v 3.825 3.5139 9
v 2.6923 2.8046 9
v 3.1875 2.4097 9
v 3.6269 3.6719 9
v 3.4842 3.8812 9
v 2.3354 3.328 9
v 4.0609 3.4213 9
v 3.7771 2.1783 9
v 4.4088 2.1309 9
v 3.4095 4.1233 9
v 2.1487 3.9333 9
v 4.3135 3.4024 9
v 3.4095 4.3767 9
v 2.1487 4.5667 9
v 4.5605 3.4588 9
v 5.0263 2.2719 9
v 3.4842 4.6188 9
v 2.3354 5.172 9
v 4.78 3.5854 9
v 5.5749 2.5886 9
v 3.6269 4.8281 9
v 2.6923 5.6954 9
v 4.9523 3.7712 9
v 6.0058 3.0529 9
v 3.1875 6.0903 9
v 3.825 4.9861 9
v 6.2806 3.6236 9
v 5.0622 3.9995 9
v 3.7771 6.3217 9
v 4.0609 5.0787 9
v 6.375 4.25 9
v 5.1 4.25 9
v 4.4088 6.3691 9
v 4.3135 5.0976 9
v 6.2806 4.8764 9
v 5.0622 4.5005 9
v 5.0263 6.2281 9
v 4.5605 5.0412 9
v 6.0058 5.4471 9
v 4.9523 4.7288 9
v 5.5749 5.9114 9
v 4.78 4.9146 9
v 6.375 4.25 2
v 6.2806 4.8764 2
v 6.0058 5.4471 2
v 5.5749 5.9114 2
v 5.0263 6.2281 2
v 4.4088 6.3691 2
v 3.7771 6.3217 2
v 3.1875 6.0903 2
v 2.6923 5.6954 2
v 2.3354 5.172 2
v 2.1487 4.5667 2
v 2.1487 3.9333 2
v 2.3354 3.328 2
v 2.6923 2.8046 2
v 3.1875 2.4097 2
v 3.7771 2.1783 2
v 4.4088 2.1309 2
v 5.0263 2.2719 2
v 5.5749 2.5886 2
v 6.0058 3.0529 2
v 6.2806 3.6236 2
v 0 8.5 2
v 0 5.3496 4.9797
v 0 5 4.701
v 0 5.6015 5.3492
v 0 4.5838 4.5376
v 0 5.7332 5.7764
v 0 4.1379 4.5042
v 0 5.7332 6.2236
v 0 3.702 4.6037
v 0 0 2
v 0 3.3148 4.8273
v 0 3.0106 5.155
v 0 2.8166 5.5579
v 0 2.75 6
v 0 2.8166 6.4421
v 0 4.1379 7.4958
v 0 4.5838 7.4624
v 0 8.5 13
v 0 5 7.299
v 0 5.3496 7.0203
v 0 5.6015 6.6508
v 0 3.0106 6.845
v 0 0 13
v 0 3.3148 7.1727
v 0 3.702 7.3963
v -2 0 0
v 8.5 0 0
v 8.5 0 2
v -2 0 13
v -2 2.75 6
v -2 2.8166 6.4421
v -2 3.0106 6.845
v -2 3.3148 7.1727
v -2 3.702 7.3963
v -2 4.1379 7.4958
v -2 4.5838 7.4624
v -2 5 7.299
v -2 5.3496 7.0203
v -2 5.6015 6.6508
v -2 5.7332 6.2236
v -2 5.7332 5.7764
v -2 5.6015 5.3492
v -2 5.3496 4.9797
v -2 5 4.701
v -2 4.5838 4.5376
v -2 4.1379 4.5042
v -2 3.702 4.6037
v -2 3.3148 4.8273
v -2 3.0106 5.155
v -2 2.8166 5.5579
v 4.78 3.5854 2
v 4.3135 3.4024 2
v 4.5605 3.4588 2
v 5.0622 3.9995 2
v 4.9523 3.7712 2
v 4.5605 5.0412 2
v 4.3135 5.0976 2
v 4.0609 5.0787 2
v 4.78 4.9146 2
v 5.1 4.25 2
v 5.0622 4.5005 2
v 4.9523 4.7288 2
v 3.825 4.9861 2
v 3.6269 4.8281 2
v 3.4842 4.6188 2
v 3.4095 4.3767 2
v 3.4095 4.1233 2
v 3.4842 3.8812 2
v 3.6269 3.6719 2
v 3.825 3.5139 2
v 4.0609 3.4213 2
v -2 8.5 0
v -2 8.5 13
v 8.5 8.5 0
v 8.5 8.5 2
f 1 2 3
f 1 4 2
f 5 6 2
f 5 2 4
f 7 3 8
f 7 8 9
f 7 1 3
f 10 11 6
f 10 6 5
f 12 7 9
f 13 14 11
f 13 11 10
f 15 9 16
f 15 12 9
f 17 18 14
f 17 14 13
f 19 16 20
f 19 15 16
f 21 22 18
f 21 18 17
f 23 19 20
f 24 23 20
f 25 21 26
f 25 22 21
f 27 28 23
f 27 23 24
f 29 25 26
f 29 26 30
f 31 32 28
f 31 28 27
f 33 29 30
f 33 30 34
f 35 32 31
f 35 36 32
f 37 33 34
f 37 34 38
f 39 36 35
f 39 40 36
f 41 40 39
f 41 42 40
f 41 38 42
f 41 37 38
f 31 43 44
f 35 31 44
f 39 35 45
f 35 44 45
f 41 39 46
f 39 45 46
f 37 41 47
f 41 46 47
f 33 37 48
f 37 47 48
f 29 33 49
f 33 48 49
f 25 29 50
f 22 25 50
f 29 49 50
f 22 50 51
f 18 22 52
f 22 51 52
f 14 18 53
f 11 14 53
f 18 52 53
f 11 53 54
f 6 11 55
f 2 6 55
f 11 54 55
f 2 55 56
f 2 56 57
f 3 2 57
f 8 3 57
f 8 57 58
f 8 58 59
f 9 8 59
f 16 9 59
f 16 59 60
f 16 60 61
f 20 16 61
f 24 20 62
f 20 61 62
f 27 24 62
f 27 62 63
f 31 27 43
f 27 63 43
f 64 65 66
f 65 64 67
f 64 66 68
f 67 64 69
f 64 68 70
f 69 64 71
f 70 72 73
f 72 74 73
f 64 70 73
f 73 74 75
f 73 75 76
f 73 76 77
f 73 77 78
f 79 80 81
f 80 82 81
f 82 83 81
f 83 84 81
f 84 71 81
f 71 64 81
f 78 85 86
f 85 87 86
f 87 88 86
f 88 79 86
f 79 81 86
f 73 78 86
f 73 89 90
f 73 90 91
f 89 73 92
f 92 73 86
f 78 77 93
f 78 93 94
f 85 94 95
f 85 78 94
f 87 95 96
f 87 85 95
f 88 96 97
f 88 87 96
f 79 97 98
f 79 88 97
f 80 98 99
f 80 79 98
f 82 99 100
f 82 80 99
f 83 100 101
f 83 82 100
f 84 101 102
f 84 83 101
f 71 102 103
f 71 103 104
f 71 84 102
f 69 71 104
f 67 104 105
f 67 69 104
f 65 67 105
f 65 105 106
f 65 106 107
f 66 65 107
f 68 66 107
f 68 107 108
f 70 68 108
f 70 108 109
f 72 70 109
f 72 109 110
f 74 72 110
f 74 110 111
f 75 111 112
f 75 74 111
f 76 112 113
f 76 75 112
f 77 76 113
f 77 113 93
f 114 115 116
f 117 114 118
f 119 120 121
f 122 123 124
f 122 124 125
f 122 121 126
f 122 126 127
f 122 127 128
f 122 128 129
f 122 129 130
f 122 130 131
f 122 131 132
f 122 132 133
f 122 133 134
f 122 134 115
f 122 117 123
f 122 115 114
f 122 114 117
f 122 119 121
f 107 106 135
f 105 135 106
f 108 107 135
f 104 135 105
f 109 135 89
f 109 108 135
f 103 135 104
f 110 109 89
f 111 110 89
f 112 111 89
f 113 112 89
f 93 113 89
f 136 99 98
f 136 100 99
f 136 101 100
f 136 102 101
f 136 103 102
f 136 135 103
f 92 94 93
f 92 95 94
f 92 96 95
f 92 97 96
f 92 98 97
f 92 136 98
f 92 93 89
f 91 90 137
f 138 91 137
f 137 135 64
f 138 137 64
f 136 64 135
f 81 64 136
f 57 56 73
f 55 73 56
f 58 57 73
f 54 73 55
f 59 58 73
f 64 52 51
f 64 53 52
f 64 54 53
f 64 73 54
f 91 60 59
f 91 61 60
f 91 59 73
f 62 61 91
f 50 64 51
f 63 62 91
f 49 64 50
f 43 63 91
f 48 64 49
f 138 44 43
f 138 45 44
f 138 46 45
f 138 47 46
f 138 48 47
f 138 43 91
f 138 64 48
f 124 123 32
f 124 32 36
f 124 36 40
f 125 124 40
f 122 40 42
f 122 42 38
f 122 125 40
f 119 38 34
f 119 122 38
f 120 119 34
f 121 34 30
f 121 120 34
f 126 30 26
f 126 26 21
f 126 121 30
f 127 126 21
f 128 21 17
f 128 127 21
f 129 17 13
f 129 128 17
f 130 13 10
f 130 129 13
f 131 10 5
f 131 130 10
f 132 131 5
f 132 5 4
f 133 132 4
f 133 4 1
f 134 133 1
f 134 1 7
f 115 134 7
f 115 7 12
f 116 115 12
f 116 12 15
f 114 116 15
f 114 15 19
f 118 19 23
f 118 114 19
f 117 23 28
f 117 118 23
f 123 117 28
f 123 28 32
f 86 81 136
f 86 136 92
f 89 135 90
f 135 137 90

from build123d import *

# Parameters (mm, degrees)
SKETCH007_W   = 8.5
SKETCH007_H   = 8.5
PAD005_DEPTH  = 2
SKETCH008_R   = 2.125
SKETCH008_R_2 = 0.85
PAD006_DEPTH  = 7
SKETCH009_W   = 8.5
SKETCH009_H   = 13
SKETCH009_R   = 1.5
PAD007_DEPTH  = 2


with BuildPart() as part:
    # Sketch007 → Pad005 (new body)
    with BuildSketch(Plane.XY):
        with Locations((4.25, 4.25)):
            Rectangle(SKETCH007_W, SKETCH007_H)
    extrude(amount=PAD005_DEPTH)

    # Sketch008 (on Face6 of Pad005) → Pad006 (join)
    with BuildSketch(Plane.XY.offset(2)):
        with Locations((4.25, 4.25)):
            Circle(SKETCH008_R)
        with Locations((4.25, 4.25)):
            Circle(SKETCH008_R_2, mode=Mode.SUBTRACT)
    extrude(amount=PAD006_DEPTH)

    # Sketch009 (on Face2 of Pad006) → Pad007 (join)
    with BuildSketch(Plane(origin=(0, 0, 0), x_dir=(0, -1, 0), z_dir=(-1, 0, 0))):
        with Locations((-4.25, 6.5)):
            Rectangle(SKETCH009_W, SKETCH009_H)
        with Locations((-4.25, 6)):
            Circle(SKETCH009_R, mode=Mode.SUBTRACT)
    extrude(amount=PAD007_DEPTH)


solid = part.part
